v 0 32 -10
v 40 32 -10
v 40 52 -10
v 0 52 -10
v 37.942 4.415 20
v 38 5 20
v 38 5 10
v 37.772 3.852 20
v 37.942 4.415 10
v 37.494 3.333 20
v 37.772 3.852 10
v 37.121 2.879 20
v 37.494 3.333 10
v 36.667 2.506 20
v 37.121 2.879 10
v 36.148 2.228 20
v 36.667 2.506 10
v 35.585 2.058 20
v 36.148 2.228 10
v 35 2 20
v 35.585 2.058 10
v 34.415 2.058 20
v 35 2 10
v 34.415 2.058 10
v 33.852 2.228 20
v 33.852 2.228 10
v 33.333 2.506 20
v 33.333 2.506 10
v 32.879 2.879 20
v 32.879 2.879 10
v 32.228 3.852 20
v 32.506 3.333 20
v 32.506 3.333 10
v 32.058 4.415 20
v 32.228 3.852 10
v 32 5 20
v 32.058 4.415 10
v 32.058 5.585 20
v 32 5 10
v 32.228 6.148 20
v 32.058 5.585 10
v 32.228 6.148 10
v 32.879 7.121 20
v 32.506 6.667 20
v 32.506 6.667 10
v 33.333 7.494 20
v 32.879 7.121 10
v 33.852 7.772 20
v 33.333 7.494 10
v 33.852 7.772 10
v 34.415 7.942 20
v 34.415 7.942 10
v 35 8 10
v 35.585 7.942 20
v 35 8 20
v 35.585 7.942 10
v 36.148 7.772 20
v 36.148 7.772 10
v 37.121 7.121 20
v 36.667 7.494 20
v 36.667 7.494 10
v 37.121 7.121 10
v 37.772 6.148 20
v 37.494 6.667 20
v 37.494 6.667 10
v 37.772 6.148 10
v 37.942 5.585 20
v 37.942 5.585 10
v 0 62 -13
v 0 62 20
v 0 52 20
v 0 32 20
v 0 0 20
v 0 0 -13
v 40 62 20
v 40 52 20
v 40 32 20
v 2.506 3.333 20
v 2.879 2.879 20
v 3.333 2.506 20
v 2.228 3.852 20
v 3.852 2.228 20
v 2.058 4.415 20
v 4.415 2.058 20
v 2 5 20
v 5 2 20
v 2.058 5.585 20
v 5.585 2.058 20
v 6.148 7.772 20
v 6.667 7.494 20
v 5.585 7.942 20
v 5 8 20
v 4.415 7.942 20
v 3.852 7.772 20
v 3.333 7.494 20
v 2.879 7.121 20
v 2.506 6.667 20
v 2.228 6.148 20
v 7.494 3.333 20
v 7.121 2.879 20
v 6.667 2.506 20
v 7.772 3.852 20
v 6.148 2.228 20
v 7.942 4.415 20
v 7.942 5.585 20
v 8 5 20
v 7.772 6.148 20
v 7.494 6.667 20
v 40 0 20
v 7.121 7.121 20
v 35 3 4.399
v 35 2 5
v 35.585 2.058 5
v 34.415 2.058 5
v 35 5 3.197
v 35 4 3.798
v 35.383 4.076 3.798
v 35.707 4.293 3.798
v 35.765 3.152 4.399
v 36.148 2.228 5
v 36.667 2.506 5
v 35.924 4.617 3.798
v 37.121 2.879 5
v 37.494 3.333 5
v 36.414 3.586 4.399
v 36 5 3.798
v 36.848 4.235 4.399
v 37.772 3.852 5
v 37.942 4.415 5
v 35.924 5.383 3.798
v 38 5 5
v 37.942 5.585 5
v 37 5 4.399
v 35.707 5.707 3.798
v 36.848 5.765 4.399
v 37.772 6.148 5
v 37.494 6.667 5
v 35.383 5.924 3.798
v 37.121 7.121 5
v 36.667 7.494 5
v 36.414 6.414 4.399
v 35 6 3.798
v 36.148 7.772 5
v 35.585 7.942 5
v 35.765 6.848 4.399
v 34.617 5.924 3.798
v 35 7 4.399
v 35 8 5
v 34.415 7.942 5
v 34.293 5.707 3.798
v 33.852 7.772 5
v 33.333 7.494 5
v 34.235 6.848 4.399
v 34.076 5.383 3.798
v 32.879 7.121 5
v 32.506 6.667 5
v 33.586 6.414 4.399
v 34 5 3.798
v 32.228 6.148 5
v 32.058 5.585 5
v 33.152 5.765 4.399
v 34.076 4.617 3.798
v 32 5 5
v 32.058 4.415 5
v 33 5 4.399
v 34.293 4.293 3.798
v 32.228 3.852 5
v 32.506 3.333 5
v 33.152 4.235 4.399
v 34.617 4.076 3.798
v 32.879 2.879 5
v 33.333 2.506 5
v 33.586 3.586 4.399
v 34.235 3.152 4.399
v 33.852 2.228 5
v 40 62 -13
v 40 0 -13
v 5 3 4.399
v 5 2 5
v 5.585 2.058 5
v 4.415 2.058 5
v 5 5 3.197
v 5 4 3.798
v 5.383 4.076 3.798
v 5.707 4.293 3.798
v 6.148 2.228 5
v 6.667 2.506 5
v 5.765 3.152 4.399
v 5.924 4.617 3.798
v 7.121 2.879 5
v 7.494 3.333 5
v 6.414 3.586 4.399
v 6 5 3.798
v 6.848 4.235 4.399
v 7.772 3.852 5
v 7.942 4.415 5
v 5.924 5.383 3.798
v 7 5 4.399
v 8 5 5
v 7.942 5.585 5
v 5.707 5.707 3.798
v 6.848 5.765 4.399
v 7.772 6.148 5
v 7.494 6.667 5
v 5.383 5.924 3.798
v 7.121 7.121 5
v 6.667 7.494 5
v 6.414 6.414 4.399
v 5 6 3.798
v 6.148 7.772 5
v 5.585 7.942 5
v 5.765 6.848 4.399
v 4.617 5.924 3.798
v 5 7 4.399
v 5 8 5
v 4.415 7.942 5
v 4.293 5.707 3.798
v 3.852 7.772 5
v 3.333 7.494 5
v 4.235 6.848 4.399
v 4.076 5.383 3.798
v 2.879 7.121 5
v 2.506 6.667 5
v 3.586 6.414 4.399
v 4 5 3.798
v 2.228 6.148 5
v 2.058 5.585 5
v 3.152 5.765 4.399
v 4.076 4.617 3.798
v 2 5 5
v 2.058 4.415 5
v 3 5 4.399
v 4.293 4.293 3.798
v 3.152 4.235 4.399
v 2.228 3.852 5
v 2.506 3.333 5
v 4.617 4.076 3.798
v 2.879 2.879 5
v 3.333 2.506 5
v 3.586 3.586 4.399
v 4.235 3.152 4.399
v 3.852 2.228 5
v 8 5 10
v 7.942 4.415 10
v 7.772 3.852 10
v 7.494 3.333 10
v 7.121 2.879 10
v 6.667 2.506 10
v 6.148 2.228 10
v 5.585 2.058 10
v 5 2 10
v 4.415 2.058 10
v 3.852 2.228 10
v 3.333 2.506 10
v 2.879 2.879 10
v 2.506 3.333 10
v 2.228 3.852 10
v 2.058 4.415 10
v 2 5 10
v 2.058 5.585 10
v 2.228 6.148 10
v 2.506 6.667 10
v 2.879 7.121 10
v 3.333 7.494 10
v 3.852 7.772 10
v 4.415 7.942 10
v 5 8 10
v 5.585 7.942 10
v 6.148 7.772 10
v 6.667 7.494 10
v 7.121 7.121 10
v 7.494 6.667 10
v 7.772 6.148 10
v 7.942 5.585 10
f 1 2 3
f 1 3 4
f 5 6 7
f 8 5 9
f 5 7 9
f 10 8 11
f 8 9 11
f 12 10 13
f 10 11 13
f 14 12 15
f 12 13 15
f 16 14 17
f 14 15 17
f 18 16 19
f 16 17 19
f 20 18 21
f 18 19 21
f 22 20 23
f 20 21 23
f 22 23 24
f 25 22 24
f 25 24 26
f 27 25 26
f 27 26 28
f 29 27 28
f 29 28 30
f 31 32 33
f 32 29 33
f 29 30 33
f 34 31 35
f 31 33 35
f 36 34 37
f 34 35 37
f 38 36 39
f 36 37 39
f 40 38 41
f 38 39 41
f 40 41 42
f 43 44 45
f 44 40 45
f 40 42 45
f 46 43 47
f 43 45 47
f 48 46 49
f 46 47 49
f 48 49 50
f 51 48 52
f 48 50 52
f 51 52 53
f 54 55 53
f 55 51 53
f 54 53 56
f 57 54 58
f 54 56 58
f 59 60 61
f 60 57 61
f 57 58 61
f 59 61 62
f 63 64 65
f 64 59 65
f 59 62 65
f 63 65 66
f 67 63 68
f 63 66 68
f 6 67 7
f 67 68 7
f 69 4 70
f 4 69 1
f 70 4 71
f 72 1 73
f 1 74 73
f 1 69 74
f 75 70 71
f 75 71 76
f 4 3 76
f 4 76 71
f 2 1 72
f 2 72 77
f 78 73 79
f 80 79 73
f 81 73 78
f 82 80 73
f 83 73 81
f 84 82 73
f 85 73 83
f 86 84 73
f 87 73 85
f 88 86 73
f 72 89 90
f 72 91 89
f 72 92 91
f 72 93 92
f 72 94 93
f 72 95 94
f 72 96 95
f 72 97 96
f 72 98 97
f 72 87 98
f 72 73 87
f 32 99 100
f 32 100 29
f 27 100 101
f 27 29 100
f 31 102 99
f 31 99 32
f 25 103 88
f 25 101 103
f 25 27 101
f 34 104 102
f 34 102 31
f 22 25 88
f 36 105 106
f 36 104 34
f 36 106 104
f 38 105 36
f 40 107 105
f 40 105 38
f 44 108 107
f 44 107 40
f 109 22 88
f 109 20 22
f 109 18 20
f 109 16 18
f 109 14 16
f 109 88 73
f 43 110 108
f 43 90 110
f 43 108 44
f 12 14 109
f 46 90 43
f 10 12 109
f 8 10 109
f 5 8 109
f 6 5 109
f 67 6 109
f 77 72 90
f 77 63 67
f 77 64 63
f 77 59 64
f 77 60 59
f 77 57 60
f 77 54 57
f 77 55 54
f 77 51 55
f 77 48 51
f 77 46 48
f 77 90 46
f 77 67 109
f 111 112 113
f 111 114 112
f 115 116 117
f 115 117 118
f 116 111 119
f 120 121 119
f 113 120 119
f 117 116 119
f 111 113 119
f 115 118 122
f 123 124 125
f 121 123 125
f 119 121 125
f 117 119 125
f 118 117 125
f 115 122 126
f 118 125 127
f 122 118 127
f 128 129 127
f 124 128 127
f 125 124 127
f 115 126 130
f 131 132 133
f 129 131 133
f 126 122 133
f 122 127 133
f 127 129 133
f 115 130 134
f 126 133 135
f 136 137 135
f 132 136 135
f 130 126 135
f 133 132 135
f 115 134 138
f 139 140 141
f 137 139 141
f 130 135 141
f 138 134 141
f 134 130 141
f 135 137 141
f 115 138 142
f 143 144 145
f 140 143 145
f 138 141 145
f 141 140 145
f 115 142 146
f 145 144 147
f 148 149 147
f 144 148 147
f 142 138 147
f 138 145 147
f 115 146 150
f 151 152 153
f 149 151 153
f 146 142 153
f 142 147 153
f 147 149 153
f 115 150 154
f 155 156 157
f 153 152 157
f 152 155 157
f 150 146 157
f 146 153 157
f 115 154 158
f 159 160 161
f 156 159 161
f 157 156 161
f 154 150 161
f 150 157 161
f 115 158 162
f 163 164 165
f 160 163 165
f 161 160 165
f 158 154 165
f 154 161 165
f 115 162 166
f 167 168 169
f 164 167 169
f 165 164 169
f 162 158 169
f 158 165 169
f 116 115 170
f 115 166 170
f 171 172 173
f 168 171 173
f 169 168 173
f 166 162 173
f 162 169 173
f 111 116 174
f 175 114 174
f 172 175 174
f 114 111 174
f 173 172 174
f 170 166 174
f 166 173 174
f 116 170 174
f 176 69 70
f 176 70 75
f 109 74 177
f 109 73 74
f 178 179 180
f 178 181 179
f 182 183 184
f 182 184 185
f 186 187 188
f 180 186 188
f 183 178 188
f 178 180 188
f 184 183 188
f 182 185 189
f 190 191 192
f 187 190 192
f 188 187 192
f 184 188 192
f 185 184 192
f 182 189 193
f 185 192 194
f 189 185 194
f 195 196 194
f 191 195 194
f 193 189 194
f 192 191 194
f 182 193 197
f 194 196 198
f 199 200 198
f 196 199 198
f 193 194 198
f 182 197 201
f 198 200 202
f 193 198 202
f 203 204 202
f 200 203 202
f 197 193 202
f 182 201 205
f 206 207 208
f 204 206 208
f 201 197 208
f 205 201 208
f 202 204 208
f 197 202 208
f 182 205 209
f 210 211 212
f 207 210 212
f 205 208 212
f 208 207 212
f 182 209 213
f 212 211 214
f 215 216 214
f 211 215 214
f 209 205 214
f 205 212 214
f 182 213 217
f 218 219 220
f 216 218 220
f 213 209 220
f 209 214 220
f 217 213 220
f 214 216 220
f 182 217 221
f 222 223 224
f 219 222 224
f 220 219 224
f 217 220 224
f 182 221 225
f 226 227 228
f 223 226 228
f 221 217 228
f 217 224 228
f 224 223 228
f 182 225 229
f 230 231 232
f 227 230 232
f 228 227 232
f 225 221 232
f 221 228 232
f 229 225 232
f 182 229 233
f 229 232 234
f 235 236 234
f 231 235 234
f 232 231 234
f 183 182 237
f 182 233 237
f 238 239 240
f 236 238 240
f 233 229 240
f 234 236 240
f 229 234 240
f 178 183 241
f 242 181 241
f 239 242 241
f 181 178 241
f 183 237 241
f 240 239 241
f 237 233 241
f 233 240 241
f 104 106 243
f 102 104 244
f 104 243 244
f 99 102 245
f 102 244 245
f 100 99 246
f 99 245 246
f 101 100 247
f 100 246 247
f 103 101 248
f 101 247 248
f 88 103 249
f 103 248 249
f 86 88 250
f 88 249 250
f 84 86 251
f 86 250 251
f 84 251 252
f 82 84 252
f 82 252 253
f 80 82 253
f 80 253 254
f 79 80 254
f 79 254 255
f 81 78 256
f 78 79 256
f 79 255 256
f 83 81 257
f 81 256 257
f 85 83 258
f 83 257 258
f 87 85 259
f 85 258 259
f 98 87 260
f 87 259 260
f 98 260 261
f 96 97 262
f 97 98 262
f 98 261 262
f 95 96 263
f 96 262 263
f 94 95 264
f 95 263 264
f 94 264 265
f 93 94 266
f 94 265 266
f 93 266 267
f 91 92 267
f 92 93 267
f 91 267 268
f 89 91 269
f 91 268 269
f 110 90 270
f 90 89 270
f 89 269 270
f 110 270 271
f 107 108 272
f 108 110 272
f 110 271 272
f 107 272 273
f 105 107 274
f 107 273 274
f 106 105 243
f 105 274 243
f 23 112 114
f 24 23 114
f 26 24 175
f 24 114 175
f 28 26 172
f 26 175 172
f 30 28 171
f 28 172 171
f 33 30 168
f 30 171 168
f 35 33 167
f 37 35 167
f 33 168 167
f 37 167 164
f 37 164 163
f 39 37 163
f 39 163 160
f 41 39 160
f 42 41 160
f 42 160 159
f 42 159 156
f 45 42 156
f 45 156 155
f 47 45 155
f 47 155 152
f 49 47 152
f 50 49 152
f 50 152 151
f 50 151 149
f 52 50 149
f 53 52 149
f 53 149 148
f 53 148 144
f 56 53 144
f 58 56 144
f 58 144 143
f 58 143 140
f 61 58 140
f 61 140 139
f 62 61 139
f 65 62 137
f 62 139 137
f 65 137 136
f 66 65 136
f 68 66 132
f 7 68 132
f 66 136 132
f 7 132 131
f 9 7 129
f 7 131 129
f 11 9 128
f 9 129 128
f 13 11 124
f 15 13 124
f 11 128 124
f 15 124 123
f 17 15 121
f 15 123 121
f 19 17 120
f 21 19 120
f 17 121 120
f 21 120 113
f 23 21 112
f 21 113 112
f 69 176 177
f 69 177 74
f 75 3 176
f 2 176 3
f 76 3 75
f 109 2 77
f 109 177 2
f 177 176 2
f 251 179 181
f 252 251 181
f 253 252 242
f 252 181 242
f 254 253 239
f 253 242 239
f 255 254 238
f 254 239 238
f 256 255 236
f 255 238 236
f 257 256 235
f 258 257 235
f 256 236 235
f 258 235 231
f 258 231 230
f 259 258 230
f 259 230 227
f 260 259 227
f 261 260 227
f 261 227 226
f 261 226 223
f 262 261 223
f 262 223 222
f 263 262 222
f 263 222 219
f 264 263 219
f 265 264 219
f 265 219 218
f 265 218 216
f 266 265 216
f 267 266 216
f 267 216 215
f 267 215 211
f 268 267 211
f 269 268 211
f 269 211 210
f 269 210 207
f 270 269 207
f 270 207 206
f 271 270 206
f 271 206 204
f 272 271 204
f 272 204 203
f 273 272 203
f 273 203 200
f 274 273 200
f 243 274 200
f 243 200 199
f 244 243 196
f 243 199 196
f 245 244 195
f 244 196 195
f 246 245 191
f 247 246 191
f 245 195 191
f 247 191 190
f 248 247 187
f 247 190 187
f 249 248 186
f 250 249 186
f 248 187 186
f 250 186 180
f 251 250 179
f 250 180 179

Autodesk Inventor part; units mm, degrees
ref_plane "YZ Plane" through (0, 0, 0) normal (1, 0, 0) x (0, 1, 0)
ref_plane "XZ Plane" through (0, 0, 0) normal (0, 1, 0) x (-1, 0, 0)
ref_plane "XY Plane" through (0, 0, 0) normal (0, 0, 1) x (1, 0, 0)
sketch "Sketch1" plane through (0, 0, 0) normal (0, 0, 1) x (1, 0, 0)
  line L0 (0, 0) -> (40, 0)
  line L1 (40, 0) -> (40, 10)
  line L2 (40, 10) -> (0, 10)
  line L3 (0, 10) -> (0, 0)
  dimension "d0" = 40
  dimension "d1" = 10
extrude "Extrusion1" add sketch "Sketch1" along normal blind 10
sketch "Sketch2" plane through (0, 0, 10) normal (0, 0, 1) x (1, 0, 0)
  line L0 (0, 10) -> (0, 0) projected
  line L1 (40, 10) -> (0, 10) projected
  point P0 (5, 5)
  point P1 (35, 5)
  dimension "d4" = 30
  dimension "d5" = 5
  dimension "d6" = 5
  dimension "d7" = 5
hole "Hole1" at (5, 5, 10) at (35, 5, 10) direction (0, 0, -1) diameter 6 depth 5 tip angle 118
sketch "Sketch3" plane through (0, 0, 0) normal (0, 0, -1) x (-1, 0, 0)
  line L0 (0, 0) -> (-40, 0) projected
  line L1 (0, 10) -> (0, 0) projected
  line L2 (-40, 10) -> (0, 10) projected
  line L3 (-40, 0) -> (-40, 10) projected
extrude "Extrusion2" add sketch "Sketch3" along normal blind 10
sketch "Sketch4" plane through (0, 0, 10) normal (0, -1, 0) x (1, 0, 0)
  line L0 (40, -20) -> (0, -20)
  line L1 (0, -20) -> (0, -23)
  line L2 (0, -23) -> (40, -23)
  line L3 (40, -23) -> (40, -20)
  point P0 (0, -10)
  dimension "d17" = 3
extrude "Extrusion3" add sketch "Sketch4" against normal blind 52
sketch "Sketch5" plane through (40, 0, -13) normal (0, 0, -1) x (-1, 0, 0)
  line L0 (0, 52) -> (40, 52)
  line L1 (40, 52) -> (40, 62)
  line L2 (40, 62) -> (0, 62)
  line L3 (0, 62) -> (0, 52)
  point P0 (40, 0)
  dimension "d20" = 10
extrude "Extrusion4" add sketch "Sketch5" against normal up to surface (23 mm away)
sketch "Sketch6" plane through (0, 10, 10) normal (0, 1, 0) x (1, 0, 0)
  line L0 (0, 20) -> (0, 0) projected
  line L1 (40, 0) -> (0, 0) projected
  line L2 (40, 20) -> (40, 0) projected
  line L3 (0, 20) -> (40, 20) projected
  point P0 (0, 10)
extrude "Extrusion5" add sketch "Sketch6" along normal blind 22
sketch "Sketch7" plane through (0, 0, 10) normal (0, 0, 1) x (1, 0, 0)
  circle A0 centre (5, 5) radius 3 projected
  circle A1 centre (35, 5) radius 3 projected
  line L0 (0, 0) -> (40, 0) projected
  line L1 (40, 0) -> (40, 32) projected
  line L2 (0, 32) -> (40, 32) projected
  line L3 (0, 0) -> (0, 32) projected
  line L4 (0, 52) -> (0, 62) projected
  line L5 (40, 52) -> (0, 52) projected
  line L6 (40, 62) -> (40, 52) projected
  line L7 (0, 62) -> (40, 62) projected
extrude "Extrusion6" add sketch "Sketch7" along normal blind 10
properties part number "rail mount"
